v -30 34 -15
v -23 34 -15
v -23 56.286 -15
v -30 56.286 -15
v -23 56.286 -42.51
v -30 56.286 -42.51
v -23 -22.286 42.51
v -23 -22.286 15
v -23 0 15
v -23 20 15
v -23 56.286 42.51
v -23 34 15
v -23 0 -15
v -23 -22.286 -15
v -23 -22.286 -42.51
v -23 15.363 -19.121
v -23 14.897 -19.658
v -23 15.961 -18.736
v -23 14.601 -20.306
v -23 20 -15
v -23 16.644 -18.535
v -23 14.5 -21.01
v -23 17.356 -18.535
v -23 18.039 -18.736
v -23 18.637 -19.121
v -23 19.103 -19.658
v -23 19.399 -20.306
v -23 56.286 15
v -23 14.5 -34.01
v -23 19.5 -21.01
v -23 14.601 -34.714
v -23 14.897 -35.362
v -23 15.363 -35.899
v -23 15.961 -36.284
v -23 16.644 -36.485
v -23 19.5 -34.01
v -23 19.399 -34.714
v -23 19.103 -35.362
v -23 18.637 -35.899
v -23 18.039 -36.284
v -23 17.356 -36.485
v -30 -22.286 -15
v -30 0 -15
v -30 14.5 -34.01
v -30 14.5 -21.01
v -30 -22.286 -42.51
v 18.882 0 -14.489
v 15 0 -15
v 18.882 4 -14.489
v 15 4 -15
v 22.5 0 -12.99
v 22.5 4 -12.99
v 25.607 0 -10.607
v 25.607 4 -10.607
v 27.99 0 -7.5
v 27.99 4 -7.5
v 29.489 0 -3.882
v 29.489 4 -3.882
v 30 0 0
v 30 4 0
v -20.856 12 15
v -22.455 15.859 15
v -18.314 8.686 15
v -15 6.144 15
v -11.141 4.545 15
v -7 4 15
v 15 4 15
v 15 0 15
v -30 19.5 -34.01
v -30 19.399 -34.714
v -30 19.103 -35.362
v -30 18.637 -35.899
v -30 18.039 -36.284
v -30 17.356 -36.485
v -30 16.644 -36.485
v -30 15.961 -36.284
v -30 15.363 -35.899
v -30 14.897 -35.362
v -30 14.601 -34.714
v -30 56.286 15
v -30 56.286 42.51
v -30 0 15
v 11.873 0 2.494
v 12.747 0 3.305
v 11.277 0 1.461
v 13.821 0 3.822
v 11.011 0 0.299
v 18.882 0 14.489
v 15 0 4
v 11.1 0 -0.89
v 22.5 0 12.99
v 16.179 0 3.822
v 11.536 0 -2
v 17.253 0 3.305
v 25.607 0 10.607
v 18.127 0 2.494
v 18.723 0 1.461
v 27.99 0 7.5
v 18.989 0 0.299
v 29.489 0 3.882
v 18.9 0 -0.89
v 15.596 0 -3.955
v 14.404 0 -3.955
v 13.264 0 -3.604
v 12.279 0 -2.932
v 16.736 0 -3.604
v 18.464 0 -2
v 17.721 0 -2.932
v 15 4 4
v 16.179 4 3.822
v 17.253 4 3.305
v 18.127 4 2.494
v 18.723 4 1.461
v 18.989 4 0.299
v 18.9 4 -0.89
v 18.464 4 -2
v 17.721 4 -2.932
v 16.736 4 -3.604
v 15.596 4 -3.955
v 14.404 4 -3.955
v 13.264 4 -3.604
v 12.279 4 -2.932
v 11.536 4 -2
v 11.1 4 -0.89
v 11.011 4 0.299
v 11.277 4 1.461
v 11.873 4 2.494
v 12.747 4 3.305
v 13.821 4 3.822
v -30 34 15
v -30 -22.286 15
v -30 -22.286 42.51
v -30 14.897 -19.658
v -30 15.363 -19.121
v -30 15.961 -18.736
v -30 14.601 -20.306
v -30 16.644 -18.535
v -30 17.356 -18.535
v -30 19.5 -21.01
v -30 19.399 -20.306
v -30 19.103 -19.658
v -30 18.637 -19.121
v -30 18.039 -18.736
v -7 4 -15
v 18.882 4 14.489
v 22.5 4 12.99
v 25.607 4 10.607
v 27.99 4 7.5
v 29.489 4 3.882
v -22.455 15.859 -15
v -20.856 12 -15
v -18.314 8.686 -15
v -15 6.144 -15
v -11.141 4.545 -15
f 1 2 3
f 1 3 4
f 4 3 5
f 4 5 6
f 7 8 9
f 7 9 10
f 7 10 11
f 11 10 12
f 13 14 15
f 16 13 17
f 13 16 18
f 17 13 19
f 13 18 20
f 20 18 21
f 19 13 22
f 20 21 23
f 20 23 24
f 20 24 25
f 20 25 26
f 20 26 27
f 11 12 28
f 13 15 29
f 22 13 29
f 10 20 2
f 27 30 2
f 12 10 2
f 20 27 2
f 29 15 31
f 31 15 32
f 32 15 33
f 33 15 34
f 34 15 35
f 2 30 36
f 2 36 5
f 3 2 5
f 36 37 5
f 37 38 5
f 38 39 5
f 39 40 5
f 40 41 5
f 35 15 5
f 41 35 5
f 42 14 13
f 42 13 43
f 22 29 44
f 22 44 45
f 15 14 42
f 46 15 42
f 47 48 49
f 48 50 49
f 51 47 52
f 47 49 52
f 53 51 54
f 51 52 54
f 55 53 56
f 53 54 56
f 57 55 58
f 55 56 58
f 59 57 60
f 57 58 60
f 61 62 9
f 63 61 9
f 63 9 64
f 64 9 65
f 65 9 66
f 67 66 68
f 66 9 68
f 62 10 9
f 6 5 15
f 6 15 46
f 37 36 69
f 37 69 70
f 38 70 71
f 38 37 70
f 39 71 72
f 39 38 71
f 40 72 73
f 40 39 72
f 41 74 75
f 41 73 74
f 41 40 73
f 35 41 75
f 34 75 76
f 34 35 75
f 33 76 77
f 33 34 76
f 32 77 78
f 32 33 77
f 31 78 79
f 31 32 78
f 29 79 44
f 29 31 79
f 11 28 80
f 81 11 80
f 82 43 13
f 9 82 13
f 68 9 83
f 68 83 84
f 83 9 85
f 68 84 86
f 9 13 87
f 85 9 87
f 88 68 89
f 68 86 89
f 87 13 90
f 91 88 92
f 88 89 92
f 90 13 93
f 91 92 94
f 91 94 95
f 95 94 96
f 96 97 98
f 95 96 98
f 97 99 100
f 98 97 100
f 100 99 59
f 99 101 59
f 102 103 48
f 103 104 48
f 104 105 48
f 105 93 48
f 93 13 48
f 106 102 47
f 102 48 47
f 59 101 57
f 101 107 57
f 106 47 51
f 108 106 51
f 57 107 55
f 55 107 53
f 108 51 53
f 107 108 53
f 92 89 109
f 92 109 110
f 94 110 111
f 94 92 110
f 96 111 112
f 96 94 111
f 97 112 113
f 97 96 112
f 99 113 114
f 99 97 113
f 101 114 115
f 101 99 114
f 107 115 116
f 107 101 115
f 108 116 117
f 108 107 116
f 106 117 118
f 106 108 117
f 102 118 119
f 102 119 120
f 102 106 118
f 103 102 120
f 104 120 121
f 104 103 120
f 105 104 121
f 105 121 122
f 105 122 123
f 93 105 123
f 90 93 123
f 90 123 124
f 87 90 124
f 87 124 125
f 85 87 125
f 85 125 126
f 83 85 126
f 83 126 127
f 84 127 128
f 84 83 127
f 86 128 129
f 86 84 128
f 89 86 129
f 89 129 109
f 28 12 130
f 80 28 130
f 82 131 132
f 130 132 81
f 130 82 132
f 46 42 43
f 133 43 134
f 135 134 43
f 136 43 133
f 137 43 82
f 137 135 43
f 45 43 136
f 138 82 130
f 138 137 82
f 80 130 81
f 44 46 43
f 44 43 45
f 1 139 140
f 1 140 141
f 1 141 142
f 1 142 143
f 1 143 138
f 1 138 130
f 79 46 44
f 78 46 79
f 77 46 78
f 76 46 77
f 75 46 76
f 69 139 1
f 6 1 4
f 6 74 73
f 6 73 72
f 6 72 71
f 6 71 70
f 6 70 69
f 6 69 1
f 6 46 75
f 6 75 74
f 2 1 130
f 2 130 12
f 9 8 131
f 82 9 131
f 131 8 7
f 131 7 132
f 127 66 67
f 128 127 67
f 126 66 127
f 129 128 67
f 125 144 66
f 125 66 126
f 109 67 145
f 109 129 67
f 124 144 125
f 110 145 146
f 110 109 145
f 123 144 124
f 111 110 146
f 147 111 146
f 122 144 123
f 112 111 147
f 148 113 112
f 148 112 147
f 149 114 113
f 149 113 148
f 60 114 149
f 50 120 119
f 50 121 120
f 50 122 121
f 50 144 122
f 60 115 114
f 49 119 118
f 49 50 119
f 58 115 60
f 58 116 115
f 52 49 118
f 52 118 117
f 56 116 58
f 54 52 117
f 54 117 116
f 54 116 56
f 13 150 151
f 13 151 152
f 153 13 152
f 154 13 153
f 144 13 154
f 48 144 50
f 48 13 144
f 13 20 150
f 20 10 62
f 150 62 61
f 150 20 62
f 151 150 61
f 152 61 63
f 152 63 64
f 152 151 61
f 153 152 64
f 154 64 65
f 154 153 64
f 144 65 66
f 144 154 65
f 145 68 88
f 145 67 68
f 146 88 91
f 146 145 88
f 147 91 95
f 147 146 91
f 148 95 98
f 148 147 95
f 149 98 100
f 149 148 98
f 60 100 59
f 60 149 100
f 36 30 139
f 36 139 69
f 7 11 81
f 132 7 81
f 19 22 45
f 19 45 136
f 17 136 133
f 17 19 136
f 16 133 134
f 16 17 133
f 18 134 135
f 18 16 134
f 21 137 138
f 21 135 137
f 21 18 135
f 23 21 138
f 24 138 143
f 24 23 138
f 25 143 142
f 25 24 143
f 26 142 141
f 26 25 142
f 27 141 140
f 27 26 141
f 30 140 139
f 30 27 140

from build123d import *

# Parameters (mm, degrees)
SKETCH_1_W          = 60
SKETCH_1_H          = 30
SKETCH_1_R          = 4
EXTRUDE_1_DEPTH     = 4
SKETCH_2_W          = 7
SKETCH_2_H          = 30
EXTRUDE_2_DEPTH     = 30
SKETCH_4_W          = 7
SKETCH_4_H          = 78.572897546
EXTRUDE_3_DEPTH     = 27.51
FILLET_1_R          = 16
CUT_EXTRUDE_2_DEPTH = 89.228478483
FILLET_2_R          = 15


with BuildPart() as part:
    # 草圖1 → 填料-伸長1 (new body)
    with BuildSketch(Plane(origin=(0, 0, 0), x_dir=(1, 0, 0), z_dir=(0, 1, 0))):
        Rectangle(SKETCH_1_W, SKETCH_1_H)
        with Locations(Location((15, 0, 0), (0, 0, 270))):
            Circle(SKETCH_1_R, mode=Mode.SUBTRACT)
    extrude(amount=EXTRUDE_1_DEPTH)

    # 草圖2 → 填料-伸長2 (add)
    with BuildSketch(Plane(origin=(0, 4, 0), x_dir=(1, 0, 0), z_dir=(0, 1, 0))):
        with Locations((-26.5, 0)):
            Rectangle(SKETCH_2_W, SKETCH_2_H)
    extrude(amount=EXTRUDE_2_DEPTH)

    # 草圖4 → 填料-伸長3 (add)
    with BuildSketch(Plane(origin=(0, 0, -15), x_dir=(-1, 0, 0), z_dir=(0, 0, -1))):
        with Locations((26.5, 17)):
            Rectangle(SKETCH_4_W, SKETCH_4_H)
    extrude_3 = extrude(amount=EXTRUDE_3_DEPTH)

    # 鏡射1: 填料-伸長3 across plane
    add(extrude_3.mirror(Plane.XY))

    # 圓角1
    fillet_1_edges = [part.edges().sort_by_distance(p)[0] for p in [
        (-23, 4, 0),
    ]]
    fillet(fillet_1_edges, radius=FILLET_1_R)

    # 草圖5 → 除料-伸長2 (cut, through all)
    with BuildSketch(Plane(origin=(-23, 0, 0), x_dir=(0, 0, -1), z_dir=(1, 0, 0))):
        with BuildLine():
            Line((21.01, 19.5), (34.01, 19.5))
            ThreePointArc((34.01, 19.5), (36.51, 17), (34.01, 14.5))
            Line((34.01, 14.5), (21.01, 14.5))
            ThreePointArc((21.01, 14.5), (18.51, 17), (21.01, 19.5))
        make_face()
    extrude(amount=-CUT_EXTRUDE_2_DEPTH, mode=Mode.SUBTRACT)

    # 圓角2
    fillet_2_edges = [part.edges().sort_by_distance(p)[0] for p in [
        (30, 2, 15),
        (30, 2, -15),
    ]]
    fillet(fillet_2_edges, radius=FILLET_2_R - 0.0001)  # a hair under: the kernel refuses the full size


solid = part.part
